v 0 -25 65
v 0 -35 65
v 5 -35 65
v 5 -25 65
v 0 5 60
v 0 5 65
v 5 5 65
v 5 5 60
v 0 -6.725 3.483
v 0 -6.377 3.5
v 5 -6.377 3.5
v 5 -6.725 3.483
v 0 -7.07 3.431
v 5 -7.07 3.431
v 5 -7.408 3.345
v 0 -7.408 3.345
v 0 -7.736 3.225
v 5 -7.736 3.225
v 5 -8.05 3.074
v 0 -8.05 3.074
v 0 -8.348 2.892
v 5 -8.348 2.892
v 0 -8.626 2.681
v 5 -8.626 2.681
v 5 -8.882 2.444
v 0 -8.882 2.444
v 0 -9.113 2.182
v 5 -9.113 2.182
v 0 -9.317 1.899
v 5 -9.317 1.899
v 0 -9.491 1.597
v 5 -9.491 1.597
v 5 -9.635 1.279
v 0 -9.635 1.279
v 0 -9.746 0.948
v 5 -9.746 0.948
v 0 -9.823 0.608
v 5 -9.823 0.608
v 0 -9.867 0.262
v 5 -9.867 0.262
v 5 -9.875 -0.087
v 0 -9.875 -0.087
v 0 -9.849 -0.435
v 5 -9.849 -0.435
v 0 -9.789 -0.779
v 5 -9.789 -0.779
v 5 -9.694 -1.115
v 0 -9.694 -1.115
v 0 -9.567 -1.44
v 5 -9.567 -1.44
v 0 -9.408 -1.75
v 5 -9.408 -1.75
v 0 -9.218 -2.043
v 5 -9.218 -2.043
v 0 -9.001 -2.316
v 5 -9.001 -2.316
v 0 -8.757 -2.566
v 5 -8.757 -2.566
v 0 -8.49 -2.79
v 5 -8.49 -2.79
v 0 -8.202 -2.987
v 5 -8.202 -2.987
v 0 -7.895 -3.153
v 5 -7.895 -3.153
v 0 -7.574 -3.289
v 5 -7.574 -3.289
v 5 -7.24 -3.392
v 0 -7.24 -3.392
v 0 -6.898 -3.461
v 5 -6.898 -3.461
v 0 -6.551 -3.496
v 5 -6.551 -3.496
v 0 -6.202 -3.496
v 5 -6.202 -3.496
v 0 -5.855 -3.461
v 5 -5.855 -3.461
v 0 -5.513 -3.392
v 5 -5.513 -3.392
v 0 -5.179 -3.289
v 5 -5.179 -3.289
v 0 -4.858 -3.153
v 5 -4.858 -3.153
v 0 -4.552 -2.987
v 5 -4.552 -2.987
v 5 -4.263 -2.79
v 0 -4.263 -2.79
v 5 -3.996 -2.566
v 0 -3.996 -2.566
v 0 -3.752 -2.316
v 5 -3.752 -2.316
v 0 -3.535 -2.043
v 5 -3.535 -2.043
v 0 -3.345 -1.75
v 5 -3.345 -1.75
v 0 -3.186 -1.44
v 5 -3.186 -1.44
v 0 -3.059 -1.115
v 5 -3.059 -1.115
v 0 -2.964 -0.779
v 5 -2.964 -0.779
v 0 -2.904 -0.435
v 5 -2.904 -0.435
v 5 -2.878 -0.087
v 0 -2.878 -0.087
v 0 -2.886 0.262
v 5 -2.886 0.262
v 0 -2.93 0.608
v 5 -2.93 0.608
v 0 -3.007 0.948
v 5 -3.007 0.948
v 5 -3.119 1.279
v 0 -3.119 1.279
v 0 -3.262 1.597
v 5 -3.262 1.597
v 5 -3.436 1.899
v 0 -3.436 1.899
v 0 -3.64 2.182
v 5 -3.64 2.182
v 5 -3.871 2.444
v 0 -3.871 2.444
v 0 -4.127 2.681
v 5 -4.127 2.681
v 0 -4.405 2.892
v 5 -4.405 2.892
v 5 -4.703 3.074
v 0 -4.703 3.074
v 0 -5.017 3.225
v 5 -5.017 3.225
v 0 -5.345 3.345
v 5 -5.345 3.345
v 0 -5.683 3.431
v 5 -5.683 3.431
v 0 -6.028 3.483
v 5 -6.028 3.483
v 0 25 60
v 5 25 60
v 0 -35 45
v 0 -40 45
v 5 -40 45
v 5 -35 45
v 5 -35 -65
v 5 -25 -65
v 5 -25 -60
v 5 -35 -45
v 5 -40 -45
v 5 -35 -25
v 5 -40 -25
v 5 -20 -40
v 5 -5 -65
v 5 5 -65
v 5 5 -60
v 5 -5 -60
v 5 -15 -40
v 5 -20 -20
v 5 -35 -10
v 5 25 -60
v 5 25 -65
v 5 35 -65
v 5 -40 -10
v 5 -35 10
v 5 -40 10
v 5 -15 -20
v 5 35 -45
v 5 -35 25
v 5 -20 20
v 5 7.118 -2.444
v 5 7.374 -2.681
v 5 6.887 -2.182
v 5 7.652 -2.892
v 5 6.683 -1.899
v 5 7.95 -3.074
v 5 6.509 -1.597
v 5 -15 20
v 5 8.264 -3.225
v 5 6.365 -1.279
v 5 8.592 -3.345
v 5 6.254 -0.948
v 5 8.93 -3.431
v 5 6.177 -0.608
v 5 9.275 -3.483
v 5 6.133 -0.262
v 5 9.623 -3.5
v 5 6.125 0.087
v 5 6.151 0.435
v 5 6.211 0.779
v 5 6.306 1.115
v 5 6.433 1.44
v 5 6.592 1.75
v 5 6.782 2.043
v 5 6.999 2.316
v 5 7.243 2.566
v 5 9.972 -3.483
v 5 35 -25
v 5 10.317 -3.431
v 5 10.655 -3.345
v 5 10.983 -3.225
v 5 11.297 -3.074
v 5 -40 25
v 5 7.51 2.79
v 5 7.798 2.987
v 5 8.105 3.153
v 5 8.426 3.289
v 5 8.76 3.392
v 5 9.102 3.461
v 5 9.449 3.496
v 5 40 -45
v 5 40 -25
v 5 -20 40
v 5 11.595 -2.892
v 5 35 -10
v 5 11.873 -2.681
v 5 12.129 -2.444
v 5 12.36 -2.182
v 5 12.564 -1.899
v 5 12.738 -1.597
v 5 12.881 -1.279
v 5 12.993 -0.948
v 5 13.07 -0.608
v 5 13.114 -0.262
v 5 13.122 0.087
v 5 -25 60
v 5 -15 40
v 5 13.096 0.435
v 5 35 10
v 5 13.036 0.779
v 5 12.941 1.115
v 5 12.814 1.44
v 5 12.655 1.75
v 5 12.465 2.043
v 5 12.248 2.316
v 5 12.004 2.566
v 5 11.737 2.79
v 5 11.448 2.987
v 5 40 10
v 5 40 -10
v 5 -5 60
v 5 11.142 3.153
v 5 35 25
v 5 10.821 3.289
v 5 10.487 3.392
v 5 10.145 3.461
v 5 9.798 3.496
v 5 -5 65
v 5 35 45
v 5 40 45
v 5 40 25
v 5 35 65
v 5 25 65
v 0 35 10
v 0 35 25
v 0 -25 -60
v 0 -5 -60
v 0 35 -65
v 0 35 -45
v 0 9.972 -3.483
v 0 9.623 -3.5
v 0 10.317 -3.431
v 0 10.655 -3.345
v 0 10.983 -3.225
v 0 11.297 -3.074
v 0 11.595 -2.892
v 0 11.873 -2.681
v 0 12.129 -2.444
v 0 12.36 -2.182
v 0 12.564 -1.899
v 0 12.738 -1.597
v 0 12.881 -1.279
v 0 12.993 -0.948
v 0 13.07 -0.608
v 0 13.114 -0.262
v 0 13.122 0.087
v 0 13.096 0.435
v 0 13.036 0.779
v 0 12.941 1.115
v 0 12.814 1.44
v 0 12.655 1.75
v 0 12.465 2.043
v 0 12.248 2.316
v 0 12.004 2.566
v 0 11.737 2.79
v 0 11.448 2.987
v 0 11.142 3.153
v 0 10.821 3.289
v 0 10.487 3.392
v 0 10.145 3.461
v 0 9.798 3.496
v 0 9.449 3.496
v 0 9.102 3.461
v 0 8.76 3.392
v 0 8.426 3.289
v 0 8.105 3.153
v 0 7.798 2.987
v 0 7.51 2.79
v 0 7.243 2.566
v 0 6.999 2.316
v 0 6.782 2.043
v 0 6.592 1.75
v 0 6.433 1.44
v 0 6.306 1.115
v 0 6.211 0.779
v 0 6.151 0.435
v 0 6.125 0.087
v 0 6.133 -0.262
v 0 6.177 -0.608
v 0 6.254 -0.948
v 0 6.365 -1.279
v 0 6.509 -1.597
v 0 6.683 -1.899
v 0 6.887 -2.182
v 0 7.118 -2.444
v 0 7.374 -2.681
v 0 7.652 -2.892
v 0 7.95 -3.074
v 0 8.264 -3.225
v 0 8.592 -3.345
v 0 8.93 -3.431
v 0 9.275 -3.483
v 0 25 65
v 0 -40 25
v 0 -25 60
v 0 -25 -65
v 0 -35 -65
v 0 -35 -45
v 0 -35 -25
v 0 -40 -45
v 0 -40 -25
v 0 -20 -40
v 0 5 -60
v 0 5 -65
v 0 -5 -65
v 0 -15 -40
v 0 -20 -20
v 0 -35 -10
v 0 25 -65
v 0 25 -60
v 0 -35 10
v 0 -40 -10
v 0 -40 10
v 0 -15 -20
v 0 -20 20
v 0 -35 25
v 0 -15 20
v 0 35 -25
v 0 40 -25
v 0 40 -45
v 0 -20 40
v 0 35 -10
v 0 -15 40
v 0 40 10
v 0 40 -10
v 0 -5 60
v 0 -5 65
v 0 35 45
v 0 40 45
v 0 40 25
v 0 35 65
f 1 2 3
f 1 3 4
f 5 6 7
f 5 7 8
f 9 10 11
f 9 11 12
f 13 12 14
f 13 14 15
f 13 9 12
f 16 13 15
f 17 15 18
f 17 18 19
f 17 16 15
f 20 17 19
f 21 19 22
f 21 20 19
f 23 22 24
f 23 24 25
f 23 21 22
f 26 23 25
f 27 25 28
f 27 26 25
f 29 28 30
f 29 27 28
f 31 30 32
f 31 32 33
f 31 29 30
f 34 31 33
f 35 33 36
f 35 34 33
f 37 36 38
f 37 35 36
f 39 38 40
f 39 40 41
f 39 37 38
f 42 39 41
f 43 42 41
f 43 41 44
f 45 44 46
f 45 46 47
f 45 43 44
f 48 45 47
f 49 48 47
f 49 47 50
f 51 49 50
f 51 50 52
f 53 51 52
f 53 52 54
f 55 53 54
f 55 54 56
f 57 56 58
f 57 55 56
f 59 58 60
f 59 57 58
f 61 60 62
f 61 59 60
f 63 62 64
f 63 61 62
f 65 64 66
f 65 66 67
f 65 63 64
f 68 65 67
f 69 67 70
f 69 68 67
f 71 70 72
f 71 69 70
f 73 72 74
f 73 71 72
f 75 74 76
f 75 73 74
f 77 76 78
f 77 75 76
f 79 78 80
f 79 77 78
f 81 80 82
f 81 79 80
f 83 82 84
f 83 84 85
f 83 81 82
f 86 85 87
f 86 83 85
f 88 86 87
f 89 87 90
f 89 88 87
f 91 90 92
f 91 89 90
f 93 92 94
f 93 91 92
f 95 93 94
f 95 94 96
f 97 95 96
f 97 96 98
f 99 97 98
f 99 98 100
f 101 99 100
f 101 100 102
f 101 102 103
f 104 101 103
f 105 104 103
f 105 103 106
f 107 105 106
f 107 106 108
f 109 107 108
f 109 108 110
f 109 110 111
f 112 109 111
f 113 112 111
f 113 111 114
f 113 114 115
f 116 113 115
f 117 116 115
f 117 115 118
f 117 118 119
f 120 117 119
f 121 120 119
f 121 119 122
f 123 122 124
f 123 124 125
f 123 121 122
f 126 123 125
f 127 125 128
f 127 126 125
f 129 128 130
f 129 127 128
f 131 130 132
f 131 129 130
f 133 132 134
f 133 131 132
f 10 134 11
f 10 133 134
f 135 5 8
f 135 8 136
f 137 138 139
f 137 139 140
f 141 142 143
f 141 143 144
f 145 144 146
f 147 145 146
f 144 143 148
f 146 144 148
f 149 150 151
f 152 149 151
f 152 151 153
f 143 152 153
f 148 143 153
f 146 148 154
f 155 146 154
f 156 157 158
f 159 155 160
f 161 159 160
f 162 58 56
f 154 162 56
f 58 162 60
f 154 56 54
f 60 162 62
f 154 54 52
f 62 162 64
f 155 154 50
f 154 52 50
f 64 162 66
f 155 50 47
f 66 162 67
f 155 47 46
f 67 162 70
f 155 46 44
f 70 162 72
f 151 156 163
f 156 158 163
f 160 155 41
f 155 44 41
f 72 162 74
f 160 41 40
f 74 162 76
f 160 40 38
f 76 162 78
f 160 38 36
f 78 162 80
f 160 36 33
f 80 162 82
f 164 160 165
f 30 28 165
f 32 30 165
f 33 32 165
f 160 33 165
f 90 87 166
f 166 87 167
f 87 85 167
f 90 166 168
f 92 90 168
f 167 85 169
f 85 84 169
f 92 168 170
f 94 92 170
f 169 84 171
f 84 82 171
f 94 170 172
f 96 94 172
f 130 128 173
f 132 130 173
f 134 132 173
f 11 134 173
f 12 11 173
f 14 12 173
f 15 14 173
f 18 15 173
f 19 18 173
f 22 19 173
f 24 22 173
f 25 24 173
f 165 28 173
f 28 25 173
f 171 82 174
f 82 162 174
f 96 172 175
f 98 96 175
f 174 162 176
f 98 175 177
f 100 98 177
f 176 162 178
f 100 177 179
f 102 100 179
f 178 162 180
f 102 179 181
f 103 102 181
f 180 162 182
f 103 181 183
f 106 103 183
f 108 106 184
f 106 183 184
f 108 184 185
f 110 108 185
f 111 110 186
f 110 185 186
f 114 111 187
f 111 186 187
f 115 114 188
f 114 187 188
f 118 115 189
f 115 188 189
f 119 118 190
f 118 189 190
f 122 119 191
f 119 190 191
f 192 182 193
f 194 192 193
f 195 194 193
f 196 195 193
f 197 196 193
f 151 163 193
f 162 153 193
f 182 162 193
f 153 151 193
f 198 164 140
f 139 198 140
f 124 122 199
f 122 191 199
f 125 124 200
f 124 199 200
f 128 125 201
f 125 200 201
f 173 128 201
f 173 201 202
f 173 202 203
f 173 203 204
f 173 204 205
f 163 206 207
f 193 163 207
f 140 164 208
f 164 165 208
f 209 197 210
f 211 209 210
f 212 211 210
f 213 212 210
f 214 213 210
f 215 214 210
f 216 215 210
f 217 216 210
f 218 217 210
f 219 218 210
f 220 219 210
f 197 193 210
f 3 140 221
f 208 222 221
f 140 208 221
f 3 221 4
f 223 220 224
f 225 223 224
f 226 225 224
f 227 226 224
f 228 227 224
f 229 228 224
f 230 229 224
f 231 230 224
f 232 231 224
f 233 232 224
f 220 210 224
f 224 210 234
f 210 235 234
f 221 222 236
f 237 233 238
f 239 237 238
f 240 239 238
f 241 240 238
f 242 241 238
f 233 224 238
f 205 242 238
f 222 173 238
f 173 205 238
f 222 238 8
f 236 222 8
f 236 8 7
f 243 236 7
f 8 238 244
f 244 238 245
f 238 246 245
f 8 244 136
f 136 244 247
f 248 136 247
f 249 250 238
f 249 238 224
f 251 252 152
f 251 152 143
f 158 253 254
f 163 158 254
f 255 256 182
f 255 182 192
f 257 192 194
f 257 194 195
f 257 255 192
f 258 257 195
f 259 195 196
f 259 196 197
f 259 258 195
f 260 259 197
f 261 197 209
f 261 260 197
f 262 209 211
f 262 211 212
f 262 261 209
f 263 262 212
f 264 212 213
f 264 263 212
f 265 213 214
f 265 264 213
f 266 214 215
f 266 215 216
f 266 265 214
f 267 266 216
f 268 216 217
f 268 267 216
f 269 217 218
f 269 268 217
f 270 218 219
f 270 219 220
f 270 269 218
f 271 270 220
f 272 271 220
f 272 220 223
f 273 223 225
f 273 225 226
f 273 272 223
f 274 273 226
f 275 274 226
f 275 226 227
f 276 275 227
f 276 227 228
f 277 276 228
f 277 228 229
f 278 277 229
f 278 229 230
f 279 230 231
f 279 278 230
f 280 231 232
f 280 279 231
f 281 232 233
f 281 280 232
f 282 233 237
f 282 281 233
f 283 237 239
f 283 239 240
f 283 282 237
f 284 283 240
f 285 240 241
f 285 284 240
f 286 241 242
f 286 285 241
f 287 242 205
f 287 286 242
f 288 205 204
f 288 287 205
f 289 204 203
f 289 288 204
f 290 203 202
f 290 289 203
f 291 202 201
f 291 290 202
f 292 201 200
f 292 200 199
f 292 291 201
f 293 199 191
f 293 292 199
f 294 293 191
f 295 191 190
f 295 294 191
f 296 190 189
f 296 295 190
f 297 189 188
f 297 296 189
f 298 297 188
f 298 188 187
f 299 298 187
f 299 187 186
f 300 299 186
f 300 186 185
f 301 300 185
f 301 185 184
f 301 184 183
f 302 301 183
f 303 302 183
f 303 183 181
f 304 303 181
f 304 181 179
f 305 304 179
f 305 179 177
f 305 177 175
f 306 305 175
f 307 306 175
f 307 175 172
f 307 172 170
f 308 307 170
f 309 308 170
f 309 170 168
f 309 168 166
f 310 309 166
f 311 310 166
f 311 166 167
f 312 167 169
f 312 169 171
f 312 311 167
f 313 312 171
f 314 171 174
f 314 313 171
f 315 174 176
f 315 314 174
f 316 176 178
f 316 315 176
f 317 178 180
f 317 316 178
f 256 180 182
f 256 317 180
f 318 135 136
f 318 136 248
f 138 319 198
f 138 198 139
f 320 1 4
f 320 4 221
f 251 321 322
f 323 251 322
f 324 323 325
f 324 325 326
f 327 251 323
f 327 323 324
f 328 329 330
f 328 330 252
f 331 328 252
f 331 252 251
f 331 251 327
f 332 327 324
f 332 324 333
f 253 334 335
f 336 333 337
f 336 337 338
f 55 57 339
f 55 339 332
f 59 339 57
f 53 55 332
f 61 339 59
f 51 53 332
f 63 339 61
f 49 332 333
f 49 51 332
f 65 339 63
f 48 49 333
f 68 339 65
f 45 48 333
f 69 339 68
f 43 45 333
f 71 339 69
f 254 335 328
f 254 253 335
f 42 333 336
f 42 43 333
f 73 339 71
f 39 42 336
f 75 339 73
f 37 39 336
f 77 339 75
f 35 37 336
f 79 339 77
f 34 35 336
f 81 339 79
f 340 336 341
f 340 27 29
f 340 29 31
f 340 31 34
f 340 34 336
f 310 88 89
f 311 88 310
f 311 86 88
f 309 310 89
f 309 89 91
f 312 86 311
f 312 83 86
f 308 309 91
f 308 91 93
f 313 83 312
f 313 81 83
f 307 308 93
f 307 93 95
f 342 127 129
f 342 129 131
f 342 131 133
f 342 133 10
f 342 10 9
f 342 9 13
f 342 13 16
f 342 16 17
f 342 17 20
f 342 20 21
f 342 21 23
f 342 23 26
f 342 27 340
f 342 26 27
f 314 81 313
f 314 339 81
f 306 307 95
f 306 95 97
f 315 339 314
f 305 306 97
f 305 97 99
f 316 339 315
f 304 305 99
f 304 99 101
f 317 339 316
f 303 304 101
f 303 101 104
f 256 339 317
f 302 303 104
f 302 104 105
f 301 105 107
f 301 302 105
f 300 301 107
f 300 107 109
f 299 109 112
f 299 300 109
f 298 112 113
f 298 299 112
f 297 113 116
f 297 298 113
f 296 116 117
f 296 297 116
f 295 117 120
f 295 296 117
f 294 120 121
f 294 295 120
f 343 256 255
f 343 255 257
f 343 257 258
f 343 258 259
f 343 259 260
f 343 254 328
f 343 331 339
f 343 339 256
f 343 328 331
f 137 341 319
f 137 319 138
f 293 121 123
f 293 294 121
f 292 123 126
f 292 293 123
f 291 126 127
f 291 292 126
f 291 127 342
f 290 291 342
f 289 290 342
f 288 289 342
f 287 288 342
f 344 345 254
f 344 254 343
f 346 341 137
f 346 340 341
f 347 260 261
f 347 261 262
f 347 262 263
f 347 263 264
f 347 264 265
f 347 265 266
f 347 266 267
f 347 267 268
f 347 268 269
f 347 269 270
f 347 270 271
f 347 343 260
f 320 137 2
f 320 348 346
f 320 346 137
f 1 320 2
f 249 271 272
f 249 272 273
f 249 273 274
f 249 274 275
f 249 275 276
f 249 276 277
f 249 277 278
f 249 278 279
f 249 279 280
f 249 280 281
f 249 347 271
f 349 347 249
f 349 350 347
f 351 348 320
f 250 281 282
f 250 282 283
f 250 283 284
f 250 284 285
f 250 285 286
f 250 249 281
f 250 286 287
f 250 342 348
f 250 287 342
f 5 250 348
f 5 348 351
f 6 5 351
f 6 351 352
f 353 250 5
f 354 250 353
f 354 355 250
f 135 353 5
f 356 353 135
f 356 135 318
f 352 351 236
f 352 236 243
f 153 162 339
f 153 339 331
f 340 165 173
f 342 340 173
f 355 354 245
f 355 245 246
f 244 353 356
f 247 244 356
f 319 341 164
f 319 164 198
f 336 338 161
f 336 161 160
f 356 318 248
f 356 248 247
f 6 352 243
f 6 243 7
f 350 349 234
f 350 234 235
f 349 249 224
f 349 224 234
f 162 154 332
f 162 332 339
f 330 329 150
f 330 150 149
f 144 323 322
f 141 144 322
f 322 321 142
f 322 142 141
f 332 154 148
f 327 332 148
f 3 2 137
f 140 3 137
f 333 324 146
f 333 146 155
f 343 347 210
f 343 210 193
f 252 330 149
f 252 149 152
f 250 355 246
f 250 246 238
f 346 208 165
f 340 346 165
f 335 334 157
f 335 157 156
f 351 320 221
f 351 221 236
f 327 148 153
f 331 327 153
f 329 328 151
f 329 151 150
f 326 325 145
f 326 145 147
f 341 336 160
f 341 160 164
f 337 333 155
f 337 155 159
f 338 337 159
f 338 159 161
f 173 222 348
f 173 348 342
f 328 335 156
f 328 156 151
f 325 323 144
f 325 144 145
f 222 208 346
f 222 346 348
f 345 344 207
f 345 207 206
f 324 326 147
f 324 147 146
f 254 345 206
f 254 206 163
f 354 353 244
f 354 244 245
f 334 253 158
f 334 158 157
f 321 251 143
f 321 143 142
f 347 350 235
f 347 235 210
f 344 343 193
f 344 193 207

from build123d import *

# Parameters (mm, degrees)
BOSS_EXTRUDE1_DEPTH = 5
SKETCH3_W           = 20
SKETCH3_H           = 5
CUT_EXTRUDE2_DEPTH  = 5
SKETCH2_R           = 3.5
CUT_EXTRUDE3_DEPTH  = 5


with BuildPart() as part:
    # Sketch1 → Boss-Extrude1 (new body)
    with BuildSketch(Plane(origin=(0, 0, 0), x_dir=(0, 0, -1), z_dir=(1, 0, 0))):
        Polygon((65, 35), (65, 25), (60, 25), (60, 5), (65, 5), (65, -5), (60, -5), (60, -25), (65, -25), (65, -35), (60, -35), (45, -35), (45, -40), (25, -40), (25, -35), (10, -35), (10, -40), (-10, -40), (-10, -35), (-25, -35), (-25, -40), (-45, -40), (-45, -35), (-60, -35), (-65, -35), (-65, -25), (-60, -25), (-60, -5), (-65, -5), (-65, 5), (-60, 5), (-60, 25), (-65, 25), (-65, 35), (-60, 35), (-45, 35), (-45, 40), (-25, 40), (-25, 35), (-10, 35), (-10, 40), (10, 40), (10, 35), (25, 35), (25, 40), (45, 40), (45, 35), (60, 35), align=None)
    extrude(amount=BOSS_EXTRUDE1_DEPTH)

    # Sketch3 → Cut-Extrude2 (cut)
    with BuildSketch(Plane(origin=(5, 0, 0), x_dir=(0, 0, -1), z_dir=(1, 0, 0))):
        with Locations((30, -17.5)):
            Rectangle(SKETCH3_W, SKETCH3_H)
        with Locations((-30, -17.5)):
            Rectangle(SKETCH3_W, SKETCH3_H)
    extrude(amount=-CUT_EXTRUDE2_DEPTH, mode=Mode.SUBTRACT)

    # Sketch2 → Cut-Extrude3 (cut)
    with BuildSketch(Plane(origin=(0, 0, 0), x_dir=(0, 0, -1), z_dir=(1, 0, 0))):
        with Locations((0, 9.623429696)):
            Circle(SKETCH2_R)
        with Locations(Location((0, -6.376570304, 0), (0, 0, 180))):
            Circle(SKETCH2_R)
    extrude(amount=CUT_EXTRUDE3_DEPTH, mode=Mode.SUBTRACT)


solid = part.part
